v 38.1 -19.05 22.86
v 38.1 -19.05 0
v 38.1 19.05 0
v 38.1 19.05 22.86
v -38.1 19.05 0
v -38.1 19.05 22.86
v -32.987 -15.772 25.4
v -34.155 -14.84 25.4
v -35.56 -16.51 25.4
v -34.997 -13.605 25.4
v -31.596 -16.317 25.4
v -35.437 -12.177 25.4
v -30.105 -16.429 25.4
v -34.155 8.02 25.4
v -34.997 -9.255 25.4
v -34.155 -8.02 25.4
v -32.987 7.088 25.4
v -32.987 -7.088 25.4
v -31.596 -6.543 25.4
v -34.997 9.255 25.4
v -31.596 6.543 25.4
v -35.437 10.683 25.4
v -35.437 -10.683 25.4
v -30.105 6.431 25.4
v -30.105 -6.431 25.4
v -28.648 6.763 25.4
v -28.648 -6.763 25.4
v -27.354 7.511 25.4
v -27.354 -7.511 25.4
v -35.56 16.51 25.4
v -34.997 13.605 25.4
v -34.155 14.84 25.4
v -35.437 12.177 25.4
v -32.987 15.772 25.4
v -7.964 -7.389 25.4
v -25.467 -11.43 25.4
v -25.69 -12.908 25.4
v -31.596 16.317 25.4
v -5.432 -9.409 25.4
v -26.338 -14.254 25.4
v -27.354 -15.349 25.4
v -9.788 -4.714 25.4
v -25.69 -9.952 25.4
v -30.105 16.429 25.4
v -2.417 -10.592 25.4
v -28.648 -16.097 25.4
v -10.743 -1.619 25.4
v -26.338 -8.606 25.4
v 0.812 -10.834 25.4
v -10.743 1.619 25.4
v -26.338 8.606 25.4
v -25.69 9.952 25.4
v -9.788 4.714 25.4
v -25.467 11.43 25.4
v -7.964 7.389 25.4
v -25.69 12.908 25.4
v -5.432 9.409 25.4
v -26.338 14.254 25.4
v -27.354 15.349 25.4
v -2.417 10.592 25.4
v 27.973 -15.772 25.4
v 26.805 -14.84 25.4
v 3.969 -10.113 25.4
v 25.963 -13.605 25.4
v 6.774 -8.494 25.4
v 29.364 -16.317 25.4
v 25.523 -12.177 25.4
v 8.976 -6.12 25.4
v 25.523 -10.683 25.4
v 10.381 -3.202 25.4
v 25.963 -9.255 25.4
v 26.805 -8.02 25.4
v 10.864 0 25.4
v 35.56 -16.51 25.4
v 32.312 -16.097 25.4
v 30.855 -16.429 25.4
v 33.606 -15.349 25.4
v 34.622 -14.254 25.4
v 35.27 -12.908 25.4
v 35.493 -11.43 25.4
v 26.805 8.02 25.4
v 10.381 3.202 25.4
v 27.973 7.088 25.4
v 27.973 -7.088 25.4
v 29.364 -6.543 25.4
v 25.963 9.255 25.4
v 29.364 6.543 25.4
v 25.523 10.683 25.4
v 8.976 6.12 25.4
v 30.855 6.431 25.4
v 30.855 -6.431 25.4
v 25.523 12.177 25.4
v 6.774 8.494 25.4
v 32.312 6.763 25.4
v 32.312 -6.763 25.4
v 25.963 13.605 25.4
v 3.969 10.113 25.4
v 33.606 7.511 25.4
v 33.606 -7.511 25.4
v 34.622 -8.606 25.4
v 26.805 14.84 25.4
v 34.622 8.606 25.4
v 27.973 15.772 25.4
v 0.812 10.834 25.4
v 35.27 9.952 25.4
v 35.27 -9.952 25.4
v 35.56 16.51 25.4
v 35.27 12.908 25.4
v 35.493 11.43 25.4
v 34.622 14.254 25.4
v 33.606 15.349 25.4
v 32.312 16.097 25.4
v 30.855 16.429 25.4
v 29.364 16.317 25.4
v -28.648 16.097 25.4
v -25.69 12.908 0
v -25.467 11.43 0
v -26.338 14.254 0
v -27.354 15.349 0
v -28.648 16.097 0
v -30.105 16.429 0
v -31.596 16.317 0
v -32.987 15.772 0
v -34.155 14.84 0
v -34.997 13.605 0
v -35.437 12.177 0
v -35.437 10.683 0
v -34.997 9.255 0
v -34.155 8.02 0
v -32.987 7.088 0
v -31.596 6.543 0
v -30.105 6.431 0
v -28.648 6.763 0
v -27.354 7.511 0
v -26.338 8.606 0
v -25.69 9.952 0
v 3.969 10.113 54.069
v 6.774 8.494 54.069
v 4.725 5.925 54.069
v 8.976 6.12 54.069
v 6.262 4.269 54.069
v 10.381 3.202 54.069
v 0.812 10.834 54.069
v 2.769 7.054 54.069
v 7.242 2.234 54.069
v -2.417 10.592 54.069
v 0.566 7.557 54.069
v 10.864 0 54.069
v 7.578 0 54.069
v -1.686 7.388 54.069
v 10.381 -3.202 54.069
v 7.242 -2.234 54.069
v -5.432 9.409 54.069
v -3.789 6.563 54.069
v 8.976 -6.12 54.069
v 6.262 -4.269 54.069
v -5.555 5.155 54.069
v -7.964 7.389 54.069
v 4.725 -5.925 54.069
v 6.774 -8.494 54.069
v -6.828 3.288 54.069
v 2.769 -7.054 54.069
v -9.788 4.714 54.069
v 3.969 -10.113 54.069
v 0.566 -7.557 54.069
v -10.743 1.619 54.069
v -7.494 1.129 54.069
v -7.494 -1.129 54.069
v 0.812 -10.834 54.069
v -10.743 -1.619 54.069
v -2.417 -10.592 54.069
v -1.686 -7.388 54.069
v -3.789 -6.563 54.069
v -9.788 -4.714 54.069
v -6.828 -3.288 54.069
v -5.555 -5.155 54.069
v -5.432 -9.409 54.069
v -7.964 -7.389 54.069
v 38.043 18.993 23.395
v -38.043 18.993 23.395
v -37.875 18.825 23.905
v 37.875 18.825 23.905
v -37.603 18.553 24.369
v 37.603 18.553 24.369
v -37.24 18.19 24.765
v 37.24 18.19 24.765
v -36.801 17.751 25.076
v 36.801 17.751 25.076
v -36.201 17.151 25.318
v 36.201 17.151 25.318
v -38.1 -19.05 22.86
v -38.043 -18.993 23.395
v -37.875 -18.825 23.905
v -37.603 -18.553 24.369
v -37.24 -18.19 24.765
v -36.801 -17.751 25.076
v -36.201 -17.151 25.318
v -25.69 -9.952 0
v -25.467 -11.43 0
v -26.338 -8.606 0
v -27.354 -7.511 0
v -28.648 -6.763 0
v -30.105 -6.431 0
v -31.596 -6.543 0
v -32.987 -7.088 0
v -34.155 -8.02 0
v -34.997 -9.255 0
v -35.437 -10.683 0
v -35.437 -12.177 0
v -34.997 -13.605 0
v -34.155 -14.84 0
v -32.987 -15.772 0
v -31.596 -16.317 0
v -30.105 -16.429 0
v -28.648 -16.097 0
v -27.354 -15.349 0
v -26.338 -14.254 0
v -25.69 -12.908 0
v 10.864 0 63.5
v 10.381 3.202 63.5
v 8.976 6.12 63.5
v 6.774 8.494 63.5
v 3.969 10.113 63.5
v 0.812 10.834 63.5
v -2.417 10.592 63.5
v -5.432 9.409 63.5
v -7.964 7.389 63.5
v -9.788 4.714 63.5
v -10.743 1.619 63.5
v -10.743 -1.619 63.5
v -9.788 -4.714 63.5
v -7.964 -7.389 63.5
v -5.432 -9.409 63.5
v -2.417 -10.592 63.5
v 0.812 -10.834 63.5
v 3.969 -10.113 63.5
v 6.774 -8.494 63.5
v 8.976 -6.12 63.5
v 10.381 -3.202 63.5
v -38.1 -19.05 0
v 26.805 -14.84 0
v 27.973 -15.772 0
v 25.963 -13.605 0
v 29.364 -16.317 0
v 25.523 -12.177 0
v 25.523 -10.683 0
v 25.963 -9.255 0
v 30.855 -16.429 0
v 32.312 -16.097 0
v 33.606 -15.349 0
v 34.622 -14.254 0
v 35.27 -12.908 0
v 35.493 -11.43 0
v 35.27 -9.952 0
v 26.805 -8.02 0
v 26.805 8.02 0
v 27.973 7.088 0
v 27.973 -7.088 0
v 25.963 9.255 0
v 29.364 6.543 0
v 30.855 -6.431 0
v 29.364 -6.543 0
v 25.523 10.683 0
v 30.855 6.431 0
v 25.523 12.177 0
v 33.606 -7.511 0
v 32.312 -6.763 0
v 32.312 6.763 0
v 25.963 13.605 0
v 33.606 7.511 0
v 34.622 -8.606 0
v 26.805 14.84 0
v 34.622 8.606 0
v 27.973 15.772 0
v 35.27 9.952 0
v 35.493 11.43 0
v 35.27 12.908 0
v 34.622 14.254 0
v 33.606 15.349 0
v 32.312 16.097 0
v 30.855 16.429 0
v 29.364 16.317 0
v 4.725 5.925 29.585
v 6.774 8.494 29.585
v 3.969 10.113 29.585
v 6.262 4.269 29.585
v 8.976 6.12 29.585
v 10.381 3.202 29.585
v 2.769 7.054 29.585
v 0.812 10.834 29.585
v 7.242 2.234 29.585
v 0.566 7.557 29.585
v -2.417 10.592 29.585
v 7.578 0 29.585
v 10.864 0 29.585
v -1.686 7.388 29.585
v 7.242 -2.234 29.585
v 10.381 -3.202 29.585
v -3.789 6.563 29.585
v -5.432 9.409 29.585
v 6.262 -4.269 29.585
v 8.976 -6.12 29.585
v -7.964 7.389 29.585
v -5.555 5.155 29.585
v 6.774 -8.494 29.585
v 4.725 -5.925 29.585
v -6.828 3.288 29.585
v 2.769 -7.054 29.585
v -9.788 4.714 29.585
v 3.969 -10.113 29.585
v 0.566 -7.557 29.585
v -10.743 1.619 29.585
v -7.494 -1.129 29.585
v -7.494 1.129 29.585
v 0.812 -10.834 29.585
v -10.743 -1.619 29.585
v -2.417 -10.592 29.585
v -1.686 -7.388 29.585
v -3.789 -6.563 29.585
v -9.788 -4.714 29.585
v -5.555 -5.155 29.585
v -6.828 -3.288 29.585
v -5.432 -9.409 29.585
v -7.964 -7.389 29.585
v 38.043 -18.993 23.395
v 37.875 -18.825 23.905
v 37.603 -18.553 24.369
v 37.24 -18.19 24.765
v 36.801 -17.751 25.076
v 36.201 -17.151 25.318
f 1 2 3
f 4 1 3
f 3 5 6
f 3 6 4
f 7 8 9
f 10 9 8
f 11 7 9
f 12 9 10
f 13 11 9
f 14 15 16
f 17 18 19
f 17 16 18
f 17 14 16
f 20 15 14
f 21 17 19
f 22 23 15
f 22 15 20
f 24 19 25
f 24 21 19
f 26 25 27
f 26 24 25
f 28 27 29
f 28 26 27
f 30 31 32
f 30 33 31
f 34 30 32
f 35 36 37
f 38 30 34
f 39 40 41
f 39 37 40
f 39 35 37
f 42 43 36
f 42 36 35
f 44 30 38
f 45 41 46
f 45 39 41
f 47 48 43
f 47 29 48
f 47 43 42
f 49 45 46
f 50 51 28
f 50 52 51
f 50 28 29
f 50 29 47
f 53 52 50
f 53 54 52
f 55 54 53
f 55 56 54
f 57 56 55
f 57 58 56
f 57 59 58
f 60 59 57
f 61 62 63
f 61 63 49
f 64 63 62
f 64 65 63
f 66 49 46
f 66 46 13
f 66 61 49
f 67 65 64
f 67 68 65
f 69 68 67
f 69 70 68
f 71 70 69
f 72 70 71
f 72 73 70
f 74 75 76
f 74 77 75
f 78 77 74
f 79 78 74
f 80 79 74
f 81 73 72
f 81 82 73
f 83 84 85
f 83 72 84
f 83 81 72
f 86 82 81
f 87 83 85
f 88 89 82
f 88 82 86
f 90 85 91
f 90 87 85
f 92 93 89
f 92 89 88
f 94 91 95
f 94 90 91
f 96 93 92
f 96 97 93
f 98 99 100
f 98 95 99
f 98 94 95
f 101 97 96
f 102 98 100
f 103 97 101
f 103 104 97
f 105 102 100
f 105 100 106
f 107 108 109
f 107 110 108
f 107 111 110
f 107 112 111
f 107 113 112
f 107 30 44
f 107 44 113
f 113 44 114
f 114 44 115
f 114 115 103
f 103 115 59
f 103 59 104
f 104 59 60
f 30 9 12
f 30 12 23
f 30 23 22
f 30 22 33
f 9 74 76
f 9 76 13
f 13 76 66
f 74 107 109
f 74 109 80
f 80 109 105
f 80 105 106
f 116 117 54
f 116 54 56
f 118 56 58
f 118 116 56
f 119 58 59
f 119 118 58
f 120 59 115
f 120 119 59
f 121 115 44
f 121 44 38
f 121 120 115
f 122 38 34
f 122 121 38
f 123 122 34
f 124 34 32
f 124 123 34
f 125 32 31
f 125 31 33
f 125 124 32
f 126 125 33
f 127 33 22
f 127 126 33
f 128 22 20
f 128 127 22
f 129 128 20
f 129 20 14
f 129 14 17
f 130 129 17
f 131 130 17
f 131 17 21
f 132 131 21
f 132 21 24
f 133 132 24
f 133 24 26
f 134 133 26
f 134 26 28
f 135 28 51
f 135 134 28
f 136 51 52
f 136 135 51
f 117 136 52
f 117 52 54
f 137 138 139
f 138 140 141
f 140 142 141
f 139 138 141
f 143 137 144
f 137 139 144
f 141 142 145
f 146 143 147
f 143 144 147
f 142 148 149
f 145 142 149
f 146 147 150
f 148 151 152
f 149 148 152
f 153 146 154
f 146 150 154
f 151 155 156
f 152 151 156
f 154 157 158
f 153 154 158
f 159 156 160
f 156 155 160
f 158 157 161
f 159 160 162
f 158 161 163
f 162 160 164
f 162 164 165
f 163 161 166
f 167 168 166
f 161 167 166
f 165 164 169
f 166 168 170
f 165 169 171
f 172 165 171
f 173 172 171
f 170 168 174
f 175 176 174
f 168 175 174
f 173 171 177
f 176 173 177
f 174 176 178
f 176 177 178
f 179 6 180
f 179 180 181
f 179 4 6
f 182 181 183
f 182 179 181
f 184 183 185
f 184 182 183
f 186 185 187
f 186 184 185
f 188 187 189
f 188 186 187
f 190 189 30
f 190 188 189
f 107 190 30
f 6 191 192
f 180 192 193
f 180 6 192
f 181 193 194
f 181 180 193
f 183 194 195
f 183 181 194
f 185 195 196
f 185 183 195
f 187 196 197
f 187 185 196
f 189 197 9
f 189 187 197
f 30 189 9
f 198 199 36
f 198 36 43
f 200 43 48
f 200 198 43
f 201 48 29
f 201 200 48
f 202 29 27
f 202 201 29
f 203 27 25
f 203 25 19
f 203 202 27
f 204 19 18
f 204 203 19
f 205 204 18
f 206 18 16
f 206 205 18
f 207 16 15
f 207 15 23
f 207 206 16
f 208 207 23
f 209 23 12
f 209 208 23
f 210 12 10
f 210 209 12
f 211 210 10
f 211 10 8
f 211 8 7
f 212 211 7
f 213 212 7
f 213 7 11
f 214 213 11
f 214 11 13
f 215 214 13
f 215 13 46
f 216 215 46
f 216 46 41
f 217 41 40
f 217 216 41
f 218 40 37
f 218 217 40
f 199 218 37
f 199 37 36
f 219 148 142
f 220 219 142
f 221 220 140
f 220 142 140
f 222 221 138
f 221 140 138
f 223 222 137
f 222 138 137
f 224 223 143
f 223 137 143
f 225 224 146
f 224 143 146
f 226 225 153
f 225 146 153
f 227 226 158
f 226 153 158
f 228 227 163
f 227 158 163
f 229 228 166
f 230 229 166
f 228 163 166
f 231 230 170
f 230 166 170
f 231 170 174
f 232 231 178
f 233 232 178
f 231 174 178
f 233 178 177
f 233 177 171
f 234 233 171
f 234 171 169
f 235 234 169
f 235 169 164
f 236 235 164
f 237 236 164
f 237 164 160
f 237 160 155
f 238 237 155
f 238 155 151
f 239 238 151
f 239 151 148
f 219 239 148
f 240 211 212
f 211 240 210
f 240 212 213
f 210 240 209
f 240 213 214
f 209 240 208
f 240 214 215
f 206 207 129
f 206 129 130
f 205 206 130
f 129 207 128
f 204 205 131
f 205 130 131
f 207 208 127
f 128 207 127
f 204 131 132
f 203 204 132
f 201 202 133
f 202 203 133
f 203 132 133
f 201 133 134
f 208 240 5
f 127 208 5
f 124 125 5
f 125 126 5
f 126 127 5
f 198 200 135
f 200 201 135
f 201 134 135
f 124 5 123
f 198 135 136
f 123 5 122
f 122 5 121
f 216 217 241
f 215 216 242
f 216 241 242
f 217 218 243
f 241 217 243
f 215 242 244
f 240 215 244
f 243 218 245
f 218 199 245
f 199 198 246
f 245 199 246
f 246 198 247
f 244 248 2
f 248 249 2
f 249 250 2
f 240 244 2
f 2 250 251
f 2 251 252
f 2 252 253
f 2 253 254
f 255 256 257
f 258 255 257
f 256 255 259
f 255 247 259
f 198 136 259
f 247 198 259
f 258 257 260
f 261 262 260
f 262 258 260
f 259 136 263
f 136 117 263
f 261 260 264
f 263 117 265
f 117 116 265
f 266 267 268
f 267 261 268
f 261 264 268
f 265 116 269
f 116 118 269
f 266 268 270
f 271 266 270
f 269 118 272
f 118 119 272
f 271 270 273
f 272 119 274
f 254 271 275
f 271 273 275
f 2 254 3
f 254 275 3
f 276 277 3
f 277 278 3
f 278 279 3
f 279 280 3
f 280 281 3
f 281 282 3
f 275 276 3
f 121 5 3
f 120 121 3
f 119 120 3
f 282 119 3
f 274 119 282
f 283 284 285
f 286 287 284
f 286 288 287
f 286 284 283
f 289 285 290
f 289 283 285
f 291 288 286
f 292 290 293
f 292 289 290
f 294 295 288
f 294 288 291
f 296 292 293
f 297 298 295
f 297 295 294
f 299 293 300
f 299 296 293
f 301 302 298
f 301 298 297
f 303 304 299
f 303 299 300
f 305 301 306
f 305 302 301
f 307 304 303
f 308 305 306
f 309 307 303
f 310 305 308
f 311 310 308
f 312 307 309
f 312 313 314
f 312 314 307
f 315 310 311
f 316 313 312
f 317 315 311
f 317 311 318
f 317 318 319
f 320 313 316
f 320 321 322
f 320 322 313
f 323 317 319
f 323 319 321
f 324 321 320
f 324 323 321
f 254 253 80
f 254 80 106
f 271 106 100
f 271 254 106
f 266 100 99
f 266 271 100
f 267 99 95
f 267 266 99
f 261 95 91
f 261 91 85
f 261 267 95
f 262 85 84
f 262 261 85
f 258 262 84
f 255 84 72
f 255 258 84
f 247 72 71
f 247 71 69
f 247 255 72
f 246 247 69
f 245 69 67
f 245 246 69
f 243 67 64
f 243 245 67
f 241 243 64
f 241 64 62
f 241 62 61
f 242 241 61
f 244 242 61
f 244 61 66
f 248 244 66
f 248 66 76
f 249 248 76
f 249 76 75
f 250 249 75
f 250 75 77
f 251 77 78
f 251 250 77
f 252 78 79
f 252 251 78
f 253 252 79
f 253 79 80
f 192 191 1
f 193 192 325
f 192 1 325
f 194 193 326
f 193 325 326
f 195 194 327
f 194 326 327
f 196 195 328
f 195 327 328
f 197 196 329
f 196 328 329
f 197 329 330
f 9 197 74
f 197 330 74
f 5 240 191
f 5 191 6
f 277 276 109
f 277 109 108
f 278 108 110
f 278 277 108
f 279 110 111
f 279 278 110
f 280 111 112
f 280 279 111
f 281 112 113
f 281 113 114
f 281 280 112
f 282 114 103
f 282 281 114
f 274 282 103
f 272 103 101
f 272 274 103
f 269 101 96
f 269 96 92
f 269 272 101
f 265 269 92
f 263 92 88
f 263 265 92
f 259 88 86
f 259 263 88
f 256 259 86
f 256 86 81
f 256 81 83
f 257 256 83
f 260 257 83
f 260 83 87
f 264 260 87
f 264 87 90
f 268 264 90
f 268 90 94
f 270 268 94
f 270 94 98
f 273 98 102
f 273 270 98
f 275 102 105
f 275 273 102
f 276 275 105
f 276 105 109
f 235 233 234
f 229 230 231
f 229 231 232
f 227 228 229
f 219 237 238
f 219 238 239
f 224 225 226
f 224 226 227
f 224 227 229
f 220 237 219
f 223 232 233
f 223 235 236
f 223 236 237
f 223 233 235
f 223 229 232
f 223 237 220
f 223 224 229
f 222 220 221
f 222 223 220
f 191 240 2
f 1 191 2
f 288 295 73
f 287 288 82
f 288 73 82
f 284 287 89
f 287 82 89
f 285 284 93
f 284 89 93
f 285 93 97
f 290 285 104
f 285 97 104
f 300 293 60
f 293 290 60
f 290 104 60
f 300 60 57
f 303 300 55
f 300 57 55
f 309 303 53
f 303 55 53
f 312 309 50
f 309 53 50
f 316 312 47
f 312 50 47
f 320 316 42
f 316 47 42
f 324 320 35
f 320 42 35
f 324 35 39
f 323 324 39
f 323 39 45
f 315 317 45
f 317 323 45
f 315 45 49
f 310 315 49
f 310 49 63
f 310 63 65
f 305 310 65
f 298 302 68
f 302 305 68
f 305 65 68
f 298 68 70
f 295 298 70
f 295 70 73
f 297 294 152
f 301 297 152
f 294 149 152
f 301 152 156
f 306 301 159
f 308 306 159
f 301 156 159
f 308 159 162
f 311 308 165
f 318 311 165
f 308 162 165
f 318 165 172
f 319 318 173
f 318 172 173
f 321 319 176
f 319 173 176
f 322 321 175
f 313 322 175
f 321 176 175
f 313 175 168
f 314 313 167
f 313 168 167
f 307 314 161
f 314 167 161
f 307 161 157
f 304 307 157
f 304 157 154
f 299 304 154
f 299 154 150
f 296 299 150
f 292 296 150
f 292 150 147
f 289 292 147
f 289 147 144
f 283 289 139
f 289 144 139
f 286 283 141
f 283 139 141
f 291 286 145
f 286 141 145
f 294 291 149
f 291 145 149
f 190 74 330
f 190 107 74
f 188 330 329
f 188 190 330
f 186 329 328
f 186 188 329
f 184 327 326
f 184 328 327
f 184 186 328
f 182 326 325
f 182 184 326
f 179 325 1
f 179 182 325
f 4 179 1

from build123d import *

# Parameters (mm, degrees)
F0_W     = 76.2
F0_H     = 38.1
F1_DEPTH = 25.4
F2_R     = 5.013158
F3_DEPTH = 25.4
F4_R     = 10.86406
F5_DEPTH = 38.1
F6_R     = 2.54
F7_W     = 18.654424
F7_H     = 24.483934


with BuildPart() as f1:
    # F0 (on Top) → F1 (new body)
    with BuildSketch(Plane.XY):
        Rectangle(F0_W, F0_H)
    extrude(amount=F1_DEPTH)

    # F2 (on Top) → F3 (cut)
    with BuildSketch(Plane.XY):
        with Locations((-30.48, -11.43)):
            Circle(F2_R)
        with Locations((30.48, -11.43)):
            Circle(F2_R)
        with Locations((30.48, 11.43)):
            Circle(F2_R)
        with Locations((-30.48, 11.43)):
            Circle(F2_R)
    extrude(amount=F3_DEPTH, mode=Mode.SUBTRACT)

    # F4 (on face) → F5 (join)
    with BuildSketch(Plane.XY.offset(25.4)):
        Circle(F4_R)
    extrude(amount=F5_DEPTH)

    # F6
    f6_edges = [f1.edges().sort_by_distance(p)[0] for p in [
        (0, 19.05, 25.4),
        (-38.1, 0, 25.4),
        (0, -19.05, 25.4),
        (38.1, 0, 25.4),
    ]]
    fillet(f6_edges, radius=F6_R)

    # F7 (on Front) → F8 (revolve, cut)
    with BuildSketch(Plane.XZ):
        with Locations((16.905574, 41.826721)):
            Rectangle(F7_W, F7_H)
    revolve(axis=Axis((0, 0, 25.4), (0, 0, -1)), mode=Mode.SUBTRACT)


solid = f1.part
